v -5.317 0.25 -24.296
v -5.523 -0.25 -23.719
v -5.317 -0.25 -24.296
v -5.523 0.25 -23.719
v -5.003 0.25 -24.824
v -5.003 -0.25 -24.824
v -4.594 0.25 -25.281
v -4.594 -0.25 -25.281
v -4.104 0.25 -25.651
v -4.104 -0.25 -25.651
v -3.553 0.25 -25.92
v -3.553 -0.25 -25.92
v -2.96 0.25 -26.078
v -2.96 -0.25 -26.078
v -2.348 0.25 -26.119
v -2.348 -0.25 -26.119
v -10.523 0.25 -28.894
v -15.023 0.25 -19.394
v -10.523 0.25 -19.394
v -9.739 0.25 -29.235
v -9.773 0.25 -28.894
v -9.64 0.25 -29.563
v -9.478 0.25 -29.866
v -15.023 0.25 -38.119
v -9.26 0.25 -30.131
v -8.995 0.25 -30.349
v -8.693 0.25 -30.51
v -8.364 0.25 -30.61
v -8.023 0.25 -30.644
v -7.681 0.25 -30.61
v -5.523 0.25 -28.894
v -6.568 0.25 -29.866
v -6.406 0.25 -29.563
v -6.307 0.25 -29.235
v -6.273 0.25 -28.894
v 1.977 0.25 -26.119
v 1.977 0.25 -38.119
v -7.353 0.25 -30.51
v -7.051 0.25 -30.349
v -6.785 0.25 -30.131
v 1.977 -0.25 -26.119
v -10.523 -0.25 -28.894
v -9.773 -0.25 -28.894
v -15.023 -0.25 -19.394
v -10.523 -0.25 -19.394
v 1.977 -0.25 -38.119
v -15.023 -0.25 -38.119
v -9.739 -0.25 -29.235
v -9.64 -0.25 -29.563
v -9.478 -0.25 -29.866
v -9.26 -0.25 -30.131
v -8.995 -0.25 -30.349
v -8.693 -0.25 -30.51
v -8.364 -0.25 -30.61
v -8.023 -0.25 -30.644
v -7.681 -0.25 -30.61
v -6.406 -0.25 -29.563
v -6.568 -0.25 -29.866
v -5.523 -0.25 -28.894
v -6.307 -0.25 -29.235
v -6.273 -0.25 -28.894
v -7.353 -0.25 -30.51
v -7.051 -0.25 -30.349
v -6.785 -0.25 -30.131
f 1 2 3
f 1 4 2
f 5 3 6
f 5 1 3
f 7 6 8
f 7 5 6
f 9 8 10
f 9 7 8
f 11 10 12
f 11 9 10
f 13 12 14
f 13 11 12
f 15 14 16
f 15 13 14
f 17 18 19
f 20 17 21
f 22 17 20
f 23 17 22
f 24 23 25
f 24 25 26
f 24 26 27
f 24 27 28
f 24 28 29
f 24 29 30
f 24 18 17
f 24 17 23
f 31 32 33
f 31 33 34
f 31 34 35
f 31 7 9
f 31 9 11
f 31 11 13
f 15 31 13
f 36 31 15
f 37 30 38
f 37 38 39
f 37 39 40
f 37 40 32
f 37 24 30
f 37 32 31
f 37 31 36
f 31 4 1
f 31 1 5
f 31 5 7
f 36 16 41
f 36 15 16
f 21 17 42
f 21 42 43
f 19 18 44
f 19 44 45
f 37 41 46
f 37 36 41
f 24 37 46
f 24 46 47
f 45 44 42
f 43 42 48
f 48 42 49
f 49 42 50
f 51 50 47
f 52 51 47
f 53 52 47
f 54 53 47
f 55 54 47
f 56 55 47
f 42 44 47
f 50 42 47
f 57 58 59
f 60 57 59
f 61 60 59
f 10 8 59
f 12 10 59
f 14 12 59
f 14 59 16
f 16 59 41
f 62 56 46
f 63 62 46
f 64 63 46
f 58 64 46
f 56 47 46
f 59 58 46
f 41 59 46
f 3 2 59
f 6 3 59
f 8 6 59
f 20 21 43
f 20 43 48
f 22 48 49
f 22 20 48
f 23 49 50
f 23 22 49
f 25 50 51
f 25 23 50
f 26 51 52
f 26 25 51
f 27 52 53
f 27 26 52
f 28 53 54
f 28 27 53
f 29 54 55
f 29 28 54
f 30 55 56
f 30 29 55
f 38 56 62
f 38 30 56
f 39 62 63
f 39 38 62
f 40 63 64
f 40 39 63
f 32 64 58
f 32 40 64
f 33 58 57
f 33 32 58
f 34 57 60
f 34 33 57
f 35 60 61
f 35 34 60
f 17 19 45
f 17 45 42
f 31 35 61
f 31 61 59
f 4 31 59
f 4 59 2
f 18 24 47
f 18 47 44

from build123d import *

# Parameters (mm, degrees)
BOSS_EXTRUDE1_DEPTH = 0.25


with BuildPart() as part:
    # Sketch1 → Boss-Extrude1 (new, symmetric)
    with BuildSketch(Plane(origin=(0, 0, 0), x_dir=(1, 0, 0), z_dir=(0, 1, 0))):
        with BuildLine():
            Line((1.977113733, 26.118743762), (1.977113733, 38.118743762))
            Line((1.977113733, 38.118743762), (-15.022886267, 38.118743762))
            Line((-15.022886267, 38.118743762), (-15.022886267, 19.393587035))
            Line((-15.022886267, 19.393587035), (-10.522886267, 19.393587035))
            Line((-10.522886267, 19.393587035), (-10.522886267, 28.893587035))
            Line((-10.522886267, 28.893587035), (-9.772886267, 28.893587035))
            ThreePointArc((-9.772886267, 28.893587035), (-8.022886267, 30.643587035), (-6.272886267, 28.893587035))
            Line((-6.272886267, 28.893587035), (-5.522886267, 28.893587035))
            Line((-5.522886267, 28.893587035), (-5.522886267, 23.718587035))
            ThreePointArc((-5.522886267, 23.718587035), (-4.358162581, 25.477926708), (-2.347886267, 26.118743762))
            Line((-2.347886267, 26.118743762), (1.977113733, 26.118743762))
        make_face()
    extrude(amount=BOSS_EXTRUDE1_DEPTH, both=True)


solid = part.part
